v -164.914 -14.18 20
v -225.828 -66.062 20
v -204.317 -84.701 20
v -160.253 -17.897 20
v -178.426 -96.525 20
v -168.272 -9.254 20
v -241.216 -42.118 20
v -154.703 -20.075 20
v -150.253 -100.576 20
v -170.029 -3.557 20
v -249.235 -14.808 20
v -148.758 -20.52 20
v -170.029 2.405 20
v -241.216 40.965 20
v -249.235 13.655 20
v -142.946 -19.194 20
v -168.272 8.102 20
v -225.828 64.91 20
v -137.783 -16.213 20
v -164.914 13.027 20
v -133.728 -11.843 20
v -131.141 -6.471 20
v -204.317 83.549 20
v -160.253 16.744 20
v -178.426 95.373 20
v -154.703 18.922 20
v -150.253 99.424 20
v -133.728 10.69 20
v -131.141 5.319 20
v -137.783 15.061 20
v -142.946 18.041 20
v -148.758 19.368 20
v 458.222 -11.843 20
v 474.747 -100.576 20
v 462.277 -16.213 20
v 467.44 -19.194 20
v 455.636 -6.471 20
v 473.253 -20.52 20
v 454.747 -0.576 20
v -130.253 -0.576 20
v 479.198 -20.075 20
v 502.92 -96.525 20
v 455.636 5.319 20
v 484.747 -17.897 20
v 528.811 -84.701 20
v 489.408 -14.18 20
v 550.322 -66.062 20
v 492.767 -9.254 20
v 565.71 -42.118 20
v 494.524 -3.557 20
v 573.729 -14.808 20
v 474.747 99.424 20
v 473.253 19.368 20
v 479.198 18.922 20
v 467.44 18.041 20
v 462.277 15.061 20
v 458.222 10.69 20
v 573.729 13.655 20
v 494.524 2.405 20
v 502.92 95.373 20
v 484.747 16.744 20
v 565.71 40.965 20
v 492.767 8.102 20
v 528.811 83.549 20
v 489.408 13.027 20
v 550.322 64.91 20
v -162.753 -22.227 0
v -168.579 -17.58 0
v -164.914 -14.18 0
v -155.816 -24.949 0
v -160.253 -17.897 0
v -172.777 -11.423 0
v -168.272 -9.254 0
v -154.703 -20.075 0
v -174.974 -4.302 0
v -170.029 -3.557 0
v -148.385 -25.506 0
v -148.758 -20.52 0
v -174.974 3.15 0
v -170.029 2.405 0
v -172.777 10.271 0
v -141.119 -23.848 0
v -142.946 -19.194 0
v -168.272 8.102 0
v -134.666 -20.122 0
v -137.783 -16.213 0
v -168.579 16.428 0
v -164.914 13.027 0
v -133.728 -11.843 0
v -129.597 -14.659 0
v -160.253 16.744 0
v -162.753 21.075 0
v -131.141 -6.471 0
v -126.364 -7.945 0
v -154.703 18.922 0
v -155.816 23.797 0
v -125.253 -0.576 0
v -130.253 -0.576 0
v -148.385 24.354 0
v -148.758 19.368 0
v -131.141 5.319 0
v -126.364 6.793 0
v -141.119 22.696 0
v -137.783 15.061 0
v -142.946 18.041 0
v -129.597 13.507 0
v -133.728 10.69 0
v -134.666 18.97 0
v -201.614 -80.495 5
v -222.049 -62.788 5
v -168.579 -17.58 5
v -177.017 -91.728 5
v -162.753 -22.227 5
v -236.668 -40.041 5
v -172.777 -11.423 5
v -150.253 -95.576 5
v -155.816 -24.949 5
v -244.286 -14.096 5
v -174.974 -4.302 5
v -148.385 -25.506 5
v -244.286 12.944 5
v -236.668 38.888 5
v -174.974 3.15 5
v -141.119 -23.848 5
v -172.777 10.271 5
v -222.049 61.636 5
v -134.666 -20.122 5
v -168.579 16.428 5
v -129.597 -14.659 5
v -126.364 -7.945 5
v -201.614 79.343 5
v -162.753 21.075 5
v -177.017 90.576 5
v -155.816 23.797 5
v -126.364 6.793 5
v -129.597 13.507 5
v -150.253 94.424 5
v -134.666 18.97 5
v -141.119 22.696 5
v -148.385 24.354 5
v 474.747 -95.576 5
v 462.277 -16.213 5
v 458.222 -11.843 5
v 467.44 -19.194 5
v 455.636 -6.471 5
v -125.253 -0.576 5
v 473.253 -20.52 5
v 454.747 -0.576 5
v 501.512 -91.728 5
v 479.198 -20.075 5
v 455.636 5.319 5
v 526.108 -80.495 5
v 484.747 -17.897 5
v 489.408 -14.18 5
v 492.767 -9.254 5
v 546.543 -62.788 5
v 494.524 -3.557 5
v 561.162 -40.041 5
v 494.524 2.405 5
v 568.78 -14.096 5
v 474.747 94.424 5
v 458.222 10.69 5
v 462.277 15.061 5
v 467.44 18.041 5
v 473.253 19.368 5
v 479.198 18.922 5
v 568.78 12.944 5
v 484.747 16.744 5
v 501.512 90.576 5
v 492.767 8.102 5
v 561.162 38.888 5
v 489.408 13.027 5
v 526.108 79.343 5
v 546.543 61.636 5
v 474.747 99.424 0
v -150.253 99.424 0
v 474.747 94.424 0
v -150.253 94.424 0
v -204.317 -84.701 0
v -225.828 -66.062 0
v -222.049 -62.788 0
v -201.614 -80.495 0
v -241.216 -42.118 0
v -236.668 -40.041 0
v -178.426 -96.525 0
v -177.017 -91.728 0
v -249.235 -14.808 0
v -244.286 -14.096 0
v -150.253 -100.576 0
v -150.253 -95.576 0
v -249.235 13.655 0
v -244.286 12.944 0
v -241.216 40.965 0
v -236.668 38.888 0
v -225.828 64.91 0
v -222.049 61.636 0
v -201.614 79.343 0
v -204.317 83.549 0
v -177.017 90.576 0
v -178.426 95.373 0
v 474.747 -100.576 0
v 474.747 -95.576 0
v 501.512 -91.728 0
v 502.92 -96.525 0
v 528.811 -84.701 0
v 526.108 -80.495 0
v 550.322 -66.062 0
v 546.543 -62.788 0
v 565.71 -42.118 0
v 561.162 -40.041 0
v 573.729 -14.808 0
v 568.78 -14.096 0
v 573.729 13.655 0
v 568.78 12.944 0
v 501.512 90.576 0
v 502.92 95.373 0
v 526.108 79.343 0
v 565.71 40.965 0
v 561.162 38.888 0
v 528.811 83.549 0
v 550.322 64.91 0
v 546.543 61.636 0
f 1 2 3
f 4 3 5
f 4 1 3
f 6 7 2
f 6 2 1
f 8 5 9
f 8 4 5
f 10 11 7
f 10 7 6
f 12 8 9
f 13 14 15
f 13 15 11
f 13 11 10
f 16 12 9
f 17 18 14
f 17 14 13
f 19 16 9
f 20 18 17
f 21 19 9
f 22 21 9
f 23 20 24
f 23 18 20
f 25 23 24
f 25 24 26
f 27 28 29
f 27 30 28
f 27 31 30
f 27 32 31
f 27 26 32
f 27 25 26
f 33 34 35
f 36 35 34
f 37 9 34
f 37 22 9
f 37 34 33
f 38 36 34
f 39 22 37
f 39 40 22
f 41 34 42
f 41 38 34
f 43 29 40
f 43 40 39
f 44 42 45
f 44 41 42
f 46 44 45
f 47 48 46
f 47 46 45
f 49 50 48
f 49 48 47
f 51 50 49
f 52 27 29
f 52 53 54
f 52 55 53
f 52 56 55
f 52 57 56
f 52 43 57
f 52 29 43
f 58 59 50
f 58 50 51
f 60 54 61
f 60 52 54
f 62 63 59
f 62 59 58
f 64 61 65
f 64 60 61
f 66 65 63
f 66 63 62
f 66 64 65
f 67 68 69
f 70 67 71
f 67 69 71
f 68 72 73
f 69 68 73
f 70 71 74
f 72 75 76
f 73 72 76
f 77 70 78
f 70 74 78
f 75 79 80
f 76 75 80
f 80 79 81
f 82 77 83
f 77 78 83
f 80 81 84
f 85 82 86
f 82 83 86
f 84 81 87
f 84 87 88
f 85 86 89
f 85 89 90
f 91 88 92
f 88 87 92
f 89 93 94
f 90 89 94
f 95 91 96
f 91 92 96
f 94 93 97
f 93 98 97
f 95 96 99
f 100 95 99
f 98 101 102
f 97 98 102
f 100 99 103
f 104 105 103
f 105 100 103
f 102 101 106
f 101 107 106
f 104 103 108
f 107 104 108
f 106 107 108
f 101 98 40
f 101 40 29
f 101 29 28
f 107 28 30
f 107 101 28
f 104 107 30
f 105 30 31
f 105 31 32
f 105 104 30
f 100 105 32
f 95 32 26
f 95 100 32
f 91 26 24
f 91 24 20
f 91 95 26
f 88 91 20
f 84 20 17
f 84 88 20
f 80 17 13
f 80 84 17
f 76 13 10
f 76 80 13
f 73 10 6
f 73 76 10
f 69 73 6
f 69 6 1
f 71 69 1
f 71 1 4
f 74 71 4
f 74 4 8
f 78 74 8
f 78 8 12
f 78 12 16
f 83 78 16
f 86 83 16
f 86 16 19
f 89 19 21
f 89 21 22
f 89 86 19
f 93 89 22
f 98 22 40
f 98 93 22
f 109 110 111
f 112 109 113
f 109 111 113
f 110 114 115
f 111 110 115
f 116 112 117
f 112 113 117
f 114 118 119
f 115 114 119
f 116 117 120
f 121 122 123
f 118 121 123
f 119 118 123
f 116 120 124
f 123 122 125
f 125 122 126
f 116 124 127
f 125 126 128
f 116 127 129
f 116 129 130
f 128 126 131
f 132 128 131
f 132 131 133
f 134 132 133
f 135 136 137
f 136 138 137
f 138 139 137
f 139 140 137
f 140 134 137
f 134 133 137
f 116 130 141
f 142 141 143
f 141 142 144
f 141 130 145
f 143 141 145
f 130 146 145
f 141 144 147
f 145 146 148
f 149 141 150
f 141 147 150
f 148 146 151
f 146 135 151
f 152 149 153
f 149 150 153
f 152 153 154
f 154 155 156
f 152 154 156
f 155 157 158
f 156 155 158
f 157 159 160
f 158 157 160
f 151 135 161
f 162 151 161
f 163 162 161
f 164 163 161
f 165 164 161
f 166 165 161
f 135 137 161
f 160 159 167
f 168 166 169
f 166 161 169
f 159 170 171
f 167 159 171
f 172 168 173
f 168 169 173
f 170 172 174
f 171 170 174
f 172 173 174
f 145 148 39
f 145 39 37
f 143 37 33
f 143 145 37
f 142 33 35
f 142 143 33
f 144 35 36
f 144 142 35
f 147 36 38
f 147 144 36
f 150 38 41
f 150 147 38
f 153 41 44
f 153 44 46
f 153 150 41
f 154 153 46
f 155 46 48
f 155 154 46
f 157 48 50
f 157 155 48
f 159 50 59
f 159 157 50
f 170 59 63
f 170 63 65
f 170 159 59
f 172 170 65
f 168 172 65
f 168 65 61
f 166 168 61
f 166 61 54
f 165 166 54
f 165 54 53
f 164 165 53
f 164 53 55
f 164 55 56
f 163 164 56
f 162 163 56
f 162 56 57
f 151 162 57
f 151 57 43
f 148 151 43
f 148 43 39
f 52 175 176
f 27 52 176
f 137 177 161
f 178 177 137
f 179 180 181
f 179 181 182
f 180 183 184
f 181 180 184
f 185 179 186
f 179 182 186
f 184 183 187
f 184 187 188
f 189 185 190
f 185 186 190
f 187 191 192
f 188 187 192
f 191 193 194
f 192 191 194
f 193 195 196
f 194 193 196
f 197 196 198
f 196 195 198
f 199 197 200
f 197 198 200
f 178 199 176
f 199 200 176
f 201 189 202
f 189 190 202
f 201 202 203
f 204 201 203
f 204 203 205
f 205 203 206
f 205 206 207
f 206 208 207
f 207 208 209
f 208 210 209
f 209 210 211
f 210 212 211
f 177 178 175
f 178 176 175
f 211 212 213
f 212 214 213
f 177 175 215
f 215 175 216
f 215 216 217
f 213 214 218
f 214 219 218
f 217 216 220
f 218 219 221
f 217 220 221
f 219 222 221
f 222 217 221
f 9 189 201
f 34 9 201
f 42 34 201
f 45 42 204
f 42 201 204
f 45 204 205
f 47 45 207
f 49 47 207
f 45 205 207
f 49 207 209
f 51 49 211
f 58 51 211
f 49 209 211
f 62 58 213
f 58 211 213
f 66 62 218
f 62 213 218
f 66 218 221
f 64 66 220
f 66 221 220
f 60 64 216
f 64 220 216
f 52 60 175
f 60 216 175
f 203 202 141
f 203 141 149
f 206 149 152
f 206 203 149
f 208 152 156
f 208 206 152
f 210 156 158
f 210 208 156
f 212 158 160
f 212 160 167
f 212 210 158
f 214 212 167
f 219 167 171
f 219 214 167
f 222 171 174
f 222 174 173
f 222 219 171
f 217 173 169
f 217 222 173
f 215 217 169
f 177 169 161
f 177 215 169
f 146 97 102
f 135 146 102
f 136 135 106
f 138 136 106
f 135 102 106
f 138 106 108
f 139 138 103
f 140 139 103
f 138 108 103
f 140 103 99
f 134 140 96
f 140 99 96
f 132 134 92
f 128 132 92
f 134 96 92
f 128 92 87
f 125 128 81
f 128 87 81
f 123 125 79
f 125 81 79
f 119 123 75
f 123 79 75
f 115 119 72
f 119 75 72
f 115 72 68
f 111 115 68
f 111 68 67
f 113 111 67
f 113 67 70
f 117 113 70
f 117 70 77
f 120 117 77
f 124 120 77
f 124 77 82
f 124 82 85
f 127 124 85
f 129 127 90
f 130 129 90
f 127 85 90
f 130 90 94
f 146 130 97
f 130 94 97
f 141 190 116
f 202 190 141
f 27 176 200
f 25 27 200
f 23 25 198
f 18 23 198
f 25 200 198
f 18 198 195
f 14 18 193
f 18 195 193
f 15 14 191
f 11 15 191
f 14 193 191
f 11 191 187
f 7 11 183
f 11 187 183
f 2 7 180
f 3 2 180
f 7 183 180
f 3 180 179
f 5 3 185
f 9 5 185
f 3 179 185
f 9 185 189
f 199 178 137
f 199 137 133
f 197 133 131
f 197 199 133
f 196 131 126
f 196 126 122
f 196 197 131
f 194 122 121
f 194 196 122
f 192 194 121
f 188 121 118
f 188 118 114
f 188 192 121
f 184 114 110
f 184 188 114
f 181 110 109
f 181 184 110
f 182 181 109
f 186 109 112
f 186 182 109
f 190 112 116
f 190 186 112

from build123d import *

# Parameters (mm, degrees)
SKETCH1_R           = 20
BOSS_EXTRUDE2_DEPTH = 20
SKETCH8_R           = 25
CUT_EXTRUDE6_DEPTH  = 5


with BuildPart() as part:
    # Sketch1 → Boss-Extrude2 (new body)
    with BuildSketch(Plane.XY):
        with BuildLine():
            Line((474.74714713, 99.423872527), (-150.25285287, 99.423872527))
            ThreePointArc((-150.25285287, 99.423872527), (-250.25285287, -0.576127473), (-150.25285287, -100.576127473))
            Line((-150.25285287, -100.576127473), (474.74714713, -100.576127473))
            ThreePointArc((474.74714713, -100.576127473), (574.74714713, -0.576127473), (474.74714713, 99.423872527))
        make_face()
        with Locations((-150.25285287, -0.576127473)):
            Circle(SKETCH1_R, mode=Mode.SUBTRACT)
        with Locations(Location((474.74714713, -0.576127473, 0), (0, 0, 180))):
            Circle(SKETCH1_R, mode=Mode.SUBTRACT)
    extrude(amount=BOSS_EXTRUDE2_DEPTH)

    # Sketch8 → Cut-Extrude6 (cut)
    with BuildSketch(Plane.XY):
        with BuildLine():
            Line((-150.25285287, -95.576127473), (474.74714713, -95.576127473))
            ThreePointArc((474.74714713, -95.576127473), (569.74714713, -0.576127473), (474.74714713, 94.423872527))
            Line((474.74714713, 94.423872527), (-150.25285287, 94.423872527))
            ThreePointArc((-150.25285287, 94.423872527), (-245.25285287, -0.576127473), (-150.25285287, -95.576127473))
        make_face()
        with Locations((-150.25285287, -0.576127473)):
            Circle(SKETCH8_R, mode=Mode.SUBTRACT)
    extrude(amount=CUT_EXTRUDE6_DEPTH, mode=Mode.SUBTRACT)


solid = part.part
